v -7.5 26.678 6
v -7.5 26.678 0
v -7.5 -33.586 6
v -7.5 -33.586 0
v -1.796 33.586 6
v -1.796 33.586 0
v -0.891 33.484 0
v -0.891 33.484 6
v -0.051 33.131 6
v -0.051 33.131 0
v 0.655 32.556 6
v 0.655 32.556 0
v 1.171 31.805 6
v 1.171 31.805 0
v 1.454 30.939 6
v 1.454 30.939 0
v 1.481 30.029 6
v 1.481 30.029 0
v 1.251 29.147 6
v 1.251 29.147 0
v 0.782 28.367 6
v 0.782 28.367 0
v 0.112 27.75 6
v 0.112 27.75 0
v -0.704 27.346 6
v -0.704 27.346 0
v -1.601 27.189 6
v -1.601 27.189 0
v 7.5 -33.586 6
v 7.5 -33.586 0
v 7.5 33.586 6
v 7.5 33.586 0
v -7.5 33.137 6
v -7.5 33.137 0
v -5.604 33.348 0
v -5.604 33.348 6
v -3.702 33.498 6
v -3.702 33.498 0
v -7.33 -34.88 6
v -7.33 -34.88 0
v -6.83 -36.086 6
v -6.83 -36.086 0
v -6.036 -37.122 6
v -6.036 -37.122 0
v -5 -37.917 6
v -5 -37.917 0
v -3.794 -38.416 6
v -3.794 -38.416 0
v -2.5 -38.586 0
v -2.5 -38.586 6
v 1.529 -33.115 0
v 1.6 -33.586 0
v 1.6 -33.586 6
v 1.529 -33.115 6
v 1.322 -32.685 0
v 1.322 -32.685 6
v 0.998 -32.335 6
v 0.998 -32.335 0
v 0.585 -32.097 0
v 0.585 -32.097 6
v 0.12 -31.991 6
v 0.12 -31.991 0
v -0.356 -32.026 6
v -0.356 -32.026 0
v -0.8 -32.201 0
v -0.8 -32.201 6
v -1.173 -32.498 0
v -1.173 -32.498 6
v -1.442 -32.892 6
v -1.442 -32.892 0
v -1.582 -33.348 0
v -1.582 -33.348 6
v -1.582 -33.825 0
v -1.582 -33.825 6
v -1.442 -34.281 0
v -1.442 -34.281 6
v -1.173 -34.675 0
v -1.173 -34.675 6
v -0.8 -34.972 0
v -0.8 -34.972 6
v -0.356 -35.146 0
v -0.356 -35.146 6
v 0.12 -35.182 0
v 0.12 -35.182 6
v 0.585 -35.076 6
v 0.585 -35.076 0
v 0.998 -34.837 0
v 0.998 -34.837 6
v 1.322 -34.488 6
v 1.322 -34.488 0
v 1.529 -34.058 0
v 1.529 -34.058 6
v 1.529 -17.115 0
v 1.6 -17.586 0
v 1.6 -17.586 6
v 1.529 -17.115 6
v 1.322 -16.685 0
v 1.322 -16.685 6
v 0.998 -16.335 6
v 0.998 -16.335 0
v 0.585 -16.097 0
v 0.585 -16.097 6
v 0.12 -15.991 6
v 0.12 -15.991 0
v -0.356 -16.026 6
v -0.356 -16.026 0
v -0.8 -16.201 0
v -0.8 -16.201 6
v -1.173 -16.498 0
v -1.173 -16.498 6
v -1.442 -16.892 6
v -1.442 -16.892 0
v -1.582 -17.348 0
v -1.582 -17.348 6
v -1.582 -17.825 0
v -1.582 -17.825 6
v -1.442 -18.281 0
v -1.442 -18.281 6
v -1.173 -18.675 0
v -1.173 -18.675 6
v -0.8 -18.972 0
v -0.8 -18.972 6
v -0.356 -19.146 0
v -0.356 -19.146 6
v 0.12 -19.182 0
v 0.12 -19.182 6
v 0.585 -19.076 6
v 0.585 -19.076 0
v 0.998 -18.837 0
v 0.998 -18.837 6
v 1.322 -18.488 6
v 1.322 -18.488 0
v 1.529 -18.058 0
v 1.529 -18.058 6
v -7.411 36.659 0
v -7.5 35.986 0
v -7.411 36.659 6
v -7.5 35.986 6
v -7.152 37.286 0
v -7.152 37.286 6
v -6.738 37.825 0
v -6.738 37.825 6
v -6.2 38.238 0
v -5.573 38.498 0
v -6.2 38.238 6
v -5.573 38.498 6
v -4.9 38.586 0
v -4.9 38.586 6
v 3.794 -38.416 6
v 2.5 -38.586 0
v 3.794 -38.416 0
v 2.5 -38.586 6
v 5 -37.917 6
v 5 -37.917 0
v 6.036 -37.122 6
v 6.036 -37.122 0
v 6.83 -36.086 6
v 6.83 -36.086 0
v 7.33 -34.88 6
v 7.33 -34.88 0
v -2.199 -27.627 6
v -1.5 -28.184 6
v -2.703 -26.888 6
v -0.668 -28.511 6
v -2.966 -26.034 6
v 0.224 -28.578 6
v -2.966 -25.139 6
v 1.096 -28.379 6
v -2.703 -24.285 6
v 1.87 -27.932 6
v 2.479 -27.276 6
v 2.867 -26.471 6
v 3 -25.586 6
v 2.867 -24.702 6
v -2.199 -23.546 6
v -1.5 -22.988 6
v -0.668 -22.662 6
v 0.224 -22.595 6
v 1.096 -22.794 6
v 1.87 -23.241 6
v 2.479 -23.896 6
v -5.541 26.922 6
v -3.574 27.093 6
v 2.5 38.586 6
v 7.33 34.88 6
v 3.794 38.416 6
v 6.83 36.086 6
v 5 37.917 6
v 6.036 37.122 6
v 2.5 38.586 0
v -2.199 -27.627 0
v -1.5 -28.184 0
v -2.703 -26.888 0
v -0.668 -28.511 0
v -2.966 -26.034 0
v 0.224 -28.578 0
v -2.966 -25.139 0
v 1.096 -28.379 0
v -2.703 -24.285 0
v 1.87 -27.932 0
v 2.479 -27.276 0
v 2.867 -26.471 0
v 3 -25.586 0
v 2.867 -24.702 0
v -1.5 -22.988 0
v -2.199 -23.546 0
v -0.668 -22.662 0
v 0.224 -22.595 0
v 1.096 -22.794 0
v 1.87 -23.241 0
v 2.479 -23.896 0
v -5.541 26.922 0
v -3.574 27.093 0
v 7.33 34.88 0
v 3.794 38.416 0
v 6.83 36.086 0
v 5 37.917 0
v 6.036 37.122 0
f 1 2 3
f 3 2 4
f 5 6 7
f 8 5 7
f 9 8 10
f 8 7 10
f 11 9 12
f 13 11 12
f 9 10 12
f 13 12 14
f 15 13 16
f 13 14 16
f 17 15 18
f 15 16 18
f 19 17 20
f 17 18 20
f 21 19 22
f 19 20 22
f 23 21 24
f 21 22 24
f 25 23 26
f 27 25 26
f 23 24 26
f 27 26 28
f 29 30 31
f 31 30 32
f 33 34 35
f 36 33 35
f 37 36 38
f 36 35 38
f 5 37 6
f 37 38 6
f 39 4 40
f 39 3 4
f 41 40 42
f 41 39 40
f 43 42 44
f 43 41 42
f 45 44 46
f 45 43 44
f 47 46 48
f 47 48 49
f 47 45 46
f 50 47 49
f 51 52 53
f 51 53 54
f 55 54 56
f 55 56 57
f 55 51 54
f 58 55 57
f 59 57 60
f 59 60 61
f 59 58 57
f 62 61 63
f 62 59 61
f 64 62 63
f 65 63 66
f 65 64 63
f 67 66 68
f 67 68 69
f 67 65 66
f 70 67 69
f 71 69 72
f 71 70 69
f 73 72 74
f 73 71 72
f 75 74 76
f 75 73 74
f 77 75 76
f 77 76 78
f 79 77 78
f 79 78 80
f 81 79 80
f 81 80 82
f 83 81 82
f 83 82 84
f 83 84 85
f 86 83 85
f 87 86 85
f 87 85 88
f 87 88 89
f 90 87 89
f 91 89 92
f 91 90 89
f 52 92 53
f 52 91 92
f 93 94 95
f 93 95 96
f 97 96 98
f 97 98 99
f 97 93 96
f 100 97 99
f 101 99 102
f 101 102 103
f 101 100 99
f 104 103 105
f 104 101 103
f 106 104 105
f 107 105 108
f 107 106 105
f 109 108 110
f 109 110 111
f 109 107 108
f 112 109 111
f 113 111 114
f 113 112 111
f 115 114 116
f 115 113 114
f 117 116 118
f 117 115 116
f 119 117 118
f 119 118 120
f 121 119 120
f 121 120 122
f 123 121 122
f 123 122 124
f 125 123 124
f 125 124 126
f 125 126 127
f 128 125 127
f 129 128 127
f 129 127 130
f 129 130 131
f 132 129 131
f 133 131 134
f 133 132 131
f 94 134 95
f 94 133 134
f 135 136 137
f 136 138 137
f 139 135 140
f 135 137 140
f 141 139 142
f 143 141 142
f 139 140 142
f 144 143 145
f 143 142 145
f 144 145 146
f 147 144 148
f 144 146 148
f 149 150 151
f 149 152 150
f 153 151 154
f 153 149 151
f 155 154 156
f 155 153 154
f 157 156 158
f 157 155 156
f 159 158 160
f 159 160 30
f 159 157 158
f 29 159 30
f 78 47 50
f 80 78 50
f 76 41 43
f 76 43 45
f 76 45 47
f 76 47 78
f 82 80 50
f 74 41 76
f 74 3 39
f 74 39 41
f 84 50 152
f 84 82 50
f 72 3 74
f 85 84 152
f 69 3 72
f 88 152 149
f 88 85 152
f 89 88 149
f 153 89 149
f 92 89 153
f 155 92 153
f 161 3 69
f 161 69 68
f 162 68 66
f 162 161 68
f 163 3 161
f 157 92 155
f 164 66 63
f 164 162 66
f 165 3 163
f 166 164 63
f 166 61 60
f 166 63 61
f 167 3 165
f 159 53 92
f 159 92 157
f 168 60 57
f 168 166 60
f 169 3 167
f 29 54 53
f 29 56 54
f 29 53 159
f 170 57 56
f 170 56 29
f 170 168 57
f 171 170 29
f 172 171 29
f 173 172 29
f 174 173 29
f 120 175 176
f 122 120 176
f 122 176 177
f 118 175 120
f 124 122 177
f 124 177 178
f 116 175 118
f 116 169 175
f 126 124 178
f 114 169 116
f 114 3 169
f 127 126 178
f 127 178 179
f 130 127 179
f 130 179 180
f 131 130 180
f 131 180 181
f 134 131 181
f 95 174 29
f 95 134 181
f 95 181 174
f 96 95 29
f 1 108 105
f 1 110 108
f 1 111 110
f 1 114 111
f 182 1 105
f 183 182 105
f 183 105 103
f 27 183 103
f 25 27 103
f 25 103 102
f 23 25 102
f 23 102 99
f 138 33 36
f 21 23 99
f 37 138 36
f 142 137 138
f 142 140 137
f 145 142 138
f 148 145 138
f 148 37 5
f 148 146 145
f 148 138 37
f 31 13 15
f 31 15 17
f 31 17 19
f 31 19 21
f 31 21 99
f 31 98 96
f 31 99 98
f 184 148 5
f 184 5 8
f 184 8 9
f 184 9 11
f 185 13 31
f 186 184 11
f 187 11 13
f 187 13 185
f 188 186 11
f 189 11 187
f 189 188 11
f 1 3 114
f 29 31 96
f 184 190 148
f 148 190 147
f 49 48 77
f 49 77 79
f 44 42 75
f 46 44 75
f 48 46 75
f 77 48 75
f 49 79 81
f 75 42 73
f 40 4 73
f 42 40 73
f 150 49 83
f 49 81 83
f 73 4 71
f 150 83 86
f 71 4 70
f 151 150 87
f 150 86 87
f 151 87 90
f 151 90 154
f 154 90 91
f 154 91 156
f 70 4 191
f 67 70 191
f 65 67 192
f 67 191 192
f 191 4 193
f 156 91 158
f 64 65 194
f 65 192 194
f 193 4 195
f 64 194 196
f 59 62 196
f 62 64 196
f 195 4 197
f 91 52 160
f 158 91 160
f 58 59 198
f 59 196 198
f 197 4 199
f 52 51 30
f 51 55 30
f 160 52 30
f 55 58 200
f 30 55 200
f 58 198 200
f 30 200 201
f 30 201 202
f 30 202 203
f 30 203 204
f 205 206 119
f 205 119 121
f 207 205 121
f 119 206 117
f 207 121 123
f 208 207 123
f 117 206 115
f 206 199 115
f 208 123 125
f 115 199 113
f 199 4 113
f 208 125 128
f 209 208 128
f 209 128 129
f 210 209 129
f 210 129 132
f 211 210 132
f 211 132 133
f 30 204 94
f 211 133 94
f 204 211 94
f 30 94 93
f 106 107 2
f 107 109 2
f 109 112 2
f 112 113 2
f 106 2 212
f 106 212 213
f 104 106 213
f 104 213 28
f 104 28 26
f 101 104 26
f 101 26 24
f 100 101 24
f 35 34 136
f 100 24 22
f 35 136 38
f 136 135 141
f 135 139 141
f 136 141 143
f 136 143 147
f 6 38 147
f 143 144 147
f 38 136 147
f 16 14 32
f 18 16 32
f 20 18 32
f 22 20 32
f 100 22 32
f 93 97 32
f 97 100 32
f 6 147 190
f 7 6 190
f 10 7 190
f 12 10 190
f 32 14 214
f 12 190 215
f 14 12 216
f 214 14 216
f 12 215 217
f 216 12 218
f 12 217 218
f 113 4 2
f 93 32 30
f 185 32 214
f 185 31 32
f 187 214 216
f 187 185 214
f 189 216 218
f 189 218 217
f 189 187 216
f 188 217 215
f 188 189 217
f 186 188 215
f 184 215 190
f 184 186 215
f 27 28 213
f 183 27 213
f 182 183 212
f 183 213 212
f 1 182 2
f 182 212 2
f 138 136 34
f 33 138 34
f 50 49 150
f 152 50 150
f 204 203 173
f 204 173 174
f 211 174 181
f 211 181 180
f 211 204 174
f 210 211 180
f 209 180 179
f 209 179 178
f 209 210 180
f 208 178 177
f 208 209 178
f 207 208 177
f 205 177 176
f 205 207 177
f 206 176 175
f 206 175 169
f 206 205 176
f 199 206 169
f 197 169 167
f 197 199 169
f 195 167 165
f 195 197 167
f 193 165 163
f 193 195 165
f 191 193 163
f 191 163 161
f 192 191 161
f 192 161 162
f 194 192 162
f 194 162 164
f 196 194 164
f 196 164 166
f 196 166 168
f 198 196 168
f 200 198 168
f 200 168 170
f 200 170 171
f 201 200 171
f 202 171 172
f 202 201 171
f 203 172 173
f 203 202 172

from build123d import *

# Parameters (mm, degrees)
ESBO_O1_R                = 1.6
ESBO_O1_R_2              = 3
RESSALTO_EXTRUS_O1_DEPTH = 6
FILETE1_R                = 5
FILETE2_R                = 2.6


with BuildPart() as part:
    # Esboço1 → Ressalto-extrusão1 (new body)
    with BuildSketch(Plane.XY):
        with BuildLine():
            Line((-7.5, 26.678233731), (-7.5, -38.58638145))
            Line((-7.5, -38.58638145), (7.5, -38.58638145))
            Line((7.5, -38.58638145), (7.5, 38.58638145))
            Line((7.5, 38.58638145), (-7.5, 38.58638145))
            Line((-7.5, 38.58638145), (-7.5, 33.136612343))
            ThreePointArc((-7.5, 33.136612343), (-4.653230591, 33.430458901), (-1.795586451, 33.58638145))
            ThreePointArc((-1.795586451, 33.58638145), (1.5, 30.484912453), (-1.601468997, 27.189326002))
            ThreePointArc((-1.601468997, 27.189326002), (-4.557903938, 27.016522573), (-7.5, 26.678233731))
        make_face()
        with Locations((0, -33.58638145)):
            Circle(ESBO_O1_R, mode=Mode.SUBTRACT)
        with Locations((0, -25.58638145)):
            Circle(ESBO_O1_R_2, mode=Mode.SUBTRACT)
        with Locations((0, -17.58638145)):
            Circle(ESBO_O1_R, mode=Mode.SUBTRACT)
    extrude(amount=RESSALTO_EXTRUS_O1_DEPTH)

    # Filete1
    filete1_edges = [part.edges().sort_by_distance(p)[0] for p in [
        (7.5, 38.58638145, 3),
        (7.5, -38.58638145, 3),
        (-7.5, -38.58638145, 3),
    ]]
    fillet(filete1_edges, radius=FILETE1_R)

    # Filete2
    filete2_edges = [part.edges().sort_by_distance(p)[0] for p in [
        (-7.5, 38.58638145, 3),
    ]]
    fillet(filete2_edges, radius=FILETE2_R)


solid = part.part
